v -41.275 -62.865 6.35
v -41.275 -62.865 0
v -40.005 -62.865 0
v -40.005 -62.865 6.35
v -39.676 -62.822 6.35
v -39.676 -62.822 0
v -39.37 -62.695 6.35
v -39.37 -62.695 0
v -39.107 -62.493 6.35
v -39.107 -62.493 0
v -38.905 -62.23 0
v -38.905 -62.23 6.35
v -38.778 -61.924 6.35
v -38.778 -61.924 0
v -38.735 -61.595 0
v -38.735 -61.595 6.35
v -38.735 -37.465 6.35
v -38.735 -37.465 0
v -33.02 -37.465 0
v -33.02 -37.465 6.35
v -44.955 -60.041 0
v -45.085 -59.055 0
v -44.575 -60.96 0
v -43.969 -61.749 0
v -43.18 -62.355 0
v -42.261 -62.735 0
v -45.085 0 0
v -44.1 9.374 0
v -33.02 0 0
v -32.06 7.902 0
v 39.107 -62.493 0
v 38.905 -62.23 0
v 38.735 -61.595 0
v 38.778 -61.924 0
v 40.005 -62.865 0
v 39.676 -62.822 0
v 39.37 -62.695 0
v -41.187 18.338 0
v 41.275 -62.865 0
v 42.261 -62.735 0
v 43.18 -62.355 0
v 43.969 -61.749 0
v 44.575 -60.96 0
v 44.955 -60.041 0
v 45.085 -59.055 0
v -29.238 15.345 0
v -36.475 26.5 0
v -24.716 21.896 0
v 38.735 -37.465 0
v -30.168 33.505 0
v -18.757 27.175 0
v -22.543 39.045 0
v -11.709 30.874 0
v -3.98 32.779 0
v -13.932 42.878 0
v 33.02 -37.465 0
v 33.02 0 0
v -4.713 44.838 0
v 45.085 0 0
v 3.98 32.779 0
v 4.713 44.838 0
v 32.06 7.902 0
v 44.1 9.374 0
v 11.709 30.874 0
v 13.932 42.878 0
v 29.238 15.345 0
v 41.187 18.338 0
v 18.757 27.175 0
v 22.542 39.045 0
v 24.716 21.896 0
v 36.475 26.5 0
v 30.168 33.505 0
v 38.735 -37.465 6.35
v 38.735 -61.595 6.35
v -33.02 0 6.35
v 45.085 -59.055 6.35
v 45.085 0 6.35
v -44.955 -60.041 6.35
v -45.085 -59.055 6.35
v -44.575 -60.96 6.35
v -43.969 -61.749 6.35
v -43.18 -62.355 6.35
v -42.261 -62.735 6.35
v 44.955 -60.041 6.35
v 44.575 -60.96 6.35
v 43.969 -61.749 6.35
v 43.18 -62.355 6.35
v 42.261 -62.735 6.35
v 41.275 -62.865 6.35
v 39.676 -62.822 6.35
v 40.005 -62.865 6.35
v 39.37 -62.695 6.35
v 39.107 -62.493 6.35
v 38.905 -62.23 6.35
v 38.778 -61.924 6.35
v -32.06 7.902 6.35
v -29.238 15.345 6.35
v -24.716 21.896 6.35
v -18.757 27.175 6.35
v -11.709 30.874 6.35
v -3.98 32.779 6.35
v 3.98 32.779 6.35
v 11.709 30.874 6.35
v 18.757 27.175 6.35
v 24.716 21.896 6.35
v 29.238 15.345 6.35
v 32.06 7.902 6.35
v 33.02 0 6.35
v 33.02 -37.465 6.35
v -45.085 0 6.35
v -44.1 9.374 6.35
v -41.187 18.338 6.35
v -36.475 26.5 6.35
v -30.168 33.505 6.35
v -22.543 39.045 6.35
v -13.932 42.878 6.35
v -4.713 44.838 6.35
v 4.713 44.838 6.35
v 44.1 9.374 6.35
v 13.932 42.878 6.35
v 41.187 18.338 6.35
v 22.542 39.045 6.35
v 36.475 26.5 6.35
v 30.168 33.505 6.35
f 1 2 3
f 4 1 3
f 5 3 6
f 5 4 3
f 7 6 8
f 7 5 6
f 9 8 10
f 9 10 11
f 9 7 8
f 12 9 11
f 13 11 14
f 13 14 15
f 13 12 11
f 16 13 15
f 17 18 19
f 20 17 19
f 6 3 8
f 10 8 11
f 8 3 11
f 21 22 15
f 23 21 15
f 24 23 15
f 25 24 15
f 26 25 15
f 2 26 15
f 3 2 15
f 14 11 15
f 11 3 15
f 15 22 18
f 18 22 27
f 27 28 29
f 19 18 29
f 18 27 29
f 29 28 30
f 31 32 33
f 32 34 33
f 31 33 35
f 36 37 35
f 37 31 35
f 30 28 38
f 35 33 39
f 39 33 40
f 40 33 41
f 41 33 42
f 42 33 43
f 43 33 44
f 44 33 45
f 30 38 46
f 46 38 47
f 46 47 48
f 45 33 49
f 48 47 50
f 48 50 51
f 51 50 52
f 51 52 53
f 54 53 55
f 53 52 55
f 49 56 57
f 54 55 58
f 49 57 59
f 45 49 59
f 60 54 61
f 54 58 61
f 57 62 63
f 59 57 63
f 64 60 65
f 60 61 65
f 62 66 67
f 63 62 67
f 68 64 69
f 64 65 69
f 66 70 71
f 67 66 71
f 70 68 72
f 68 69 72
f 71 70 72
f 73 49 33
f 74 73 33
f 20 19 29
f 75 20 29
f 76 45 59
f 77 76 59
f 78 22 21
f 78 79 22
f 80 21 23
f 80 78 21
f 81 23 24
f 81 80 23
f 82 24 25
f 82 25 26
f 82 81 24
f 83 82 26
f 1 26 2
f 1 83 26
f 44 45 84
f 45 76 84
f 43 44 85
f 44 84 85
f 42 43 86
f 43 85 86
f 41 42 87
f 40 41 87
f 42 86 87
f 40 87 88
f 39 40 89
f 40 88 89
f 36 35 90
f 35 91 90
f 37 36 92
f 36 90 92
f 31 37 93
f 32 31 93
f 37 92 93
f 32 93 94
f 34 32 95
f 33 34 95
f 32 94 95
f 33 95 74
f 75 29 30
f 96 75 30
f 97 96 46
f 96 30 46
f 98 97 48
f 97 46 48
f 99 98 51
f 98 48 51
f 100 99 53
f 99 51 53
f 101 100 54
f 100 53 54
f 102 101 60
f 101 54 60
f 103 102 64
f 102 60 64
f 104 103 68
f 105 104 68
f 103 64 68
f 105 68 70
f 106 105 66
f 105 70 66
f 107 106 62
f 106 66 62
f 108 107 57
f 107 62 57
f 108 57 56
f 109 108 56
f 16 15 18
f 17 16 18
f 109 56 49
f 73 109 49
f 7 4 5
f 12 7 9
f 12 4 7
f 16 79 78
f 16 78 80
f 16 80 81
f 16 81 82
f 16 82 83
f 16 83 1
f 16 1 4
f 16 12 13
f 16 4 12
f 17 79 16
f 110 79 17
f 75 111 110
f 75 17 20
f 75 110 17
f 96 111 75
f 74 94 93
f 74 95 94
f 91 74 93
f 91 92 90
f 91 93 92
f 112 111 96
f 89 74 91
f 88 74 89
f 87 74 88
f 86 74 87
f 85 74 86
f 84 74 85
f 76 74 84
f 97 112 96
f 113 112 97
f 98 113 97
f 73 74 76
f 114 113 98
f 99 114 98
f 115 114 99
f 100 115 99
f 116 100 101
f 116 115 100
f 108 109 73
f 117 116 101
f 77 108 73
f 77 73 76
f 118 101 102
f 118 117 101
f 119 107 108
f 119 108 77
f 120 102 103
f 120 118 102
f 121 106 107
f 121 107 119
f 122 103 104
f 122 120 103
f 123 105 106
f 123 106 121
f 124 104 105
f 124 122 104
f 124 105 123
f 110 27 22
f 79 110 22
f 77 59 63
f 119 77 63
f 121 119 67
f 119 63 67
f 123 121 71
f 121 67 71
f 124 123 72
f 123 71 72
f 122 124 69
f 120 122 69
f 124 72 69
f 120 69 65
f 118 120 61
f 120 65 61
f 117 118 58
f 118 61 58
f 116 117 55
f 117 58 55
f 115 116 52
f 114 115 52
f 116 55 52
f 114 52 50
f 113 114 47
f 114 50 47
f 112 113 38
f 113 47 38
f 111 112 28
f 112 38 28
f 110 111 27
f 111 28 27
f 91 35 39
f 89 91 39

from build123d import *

# Parameters (mm, degrees)
F1_DEPTH = 6.35
F2_R     = 3.81
F3_R     = 1.27


with BuildPart() as f1:
    # F0 (on Top) → F1 (new body)
    with BuildSketch(Plane.XY):
        with BuildLine():
            Line((45.085, -62.865), (45.085, 0))
            ThreePointArc((45.085, 0), (0, 45.085), (-45.085, 0))
            Line((-45.085, 0), (-45.085, -62.865))
            Line((-45.085, -62.865), (-38.735, -62.865))
            Line((-38.735, -62.865), (-38.735, -37.465))
            Line((-38.735, -37.465), (-33.02, -37.465))
            Line((-33.02, -37.465), (-33.02, 0))
            ThreePointArc((-33.02, 0), (0, 33.02), (33.02, 0))
            Line((33.02, 0), (33.02, -37.465))
            Line((33.02, -37.465), (38.735, -37.465))
            Line((38.735, -37.465), (38.735, -62.865))
            Line((38.735, -62.865), (45.085, -62.865))
        make_face()
    extrude(amount=F1_DEPTH)

    # F2
    f2_edges = [f1.edges().sort_by_distance(p)[0] for p in [
        (-45.085, -62.865, 3.175),
        (45.085, -62.865, 3.175),
    ]]
    fillet(f2_edges, radius=F2_R)

    # F3
    f3_edges = [f1.edges().sort_by_distance(p)[0] for p in [
        (-38.735, -62.865, 3.175),
        (38.735, -62.865, 3.175),
    ]]
    fillet(f3_edges, radius=F3_R)


solid = f1.part
